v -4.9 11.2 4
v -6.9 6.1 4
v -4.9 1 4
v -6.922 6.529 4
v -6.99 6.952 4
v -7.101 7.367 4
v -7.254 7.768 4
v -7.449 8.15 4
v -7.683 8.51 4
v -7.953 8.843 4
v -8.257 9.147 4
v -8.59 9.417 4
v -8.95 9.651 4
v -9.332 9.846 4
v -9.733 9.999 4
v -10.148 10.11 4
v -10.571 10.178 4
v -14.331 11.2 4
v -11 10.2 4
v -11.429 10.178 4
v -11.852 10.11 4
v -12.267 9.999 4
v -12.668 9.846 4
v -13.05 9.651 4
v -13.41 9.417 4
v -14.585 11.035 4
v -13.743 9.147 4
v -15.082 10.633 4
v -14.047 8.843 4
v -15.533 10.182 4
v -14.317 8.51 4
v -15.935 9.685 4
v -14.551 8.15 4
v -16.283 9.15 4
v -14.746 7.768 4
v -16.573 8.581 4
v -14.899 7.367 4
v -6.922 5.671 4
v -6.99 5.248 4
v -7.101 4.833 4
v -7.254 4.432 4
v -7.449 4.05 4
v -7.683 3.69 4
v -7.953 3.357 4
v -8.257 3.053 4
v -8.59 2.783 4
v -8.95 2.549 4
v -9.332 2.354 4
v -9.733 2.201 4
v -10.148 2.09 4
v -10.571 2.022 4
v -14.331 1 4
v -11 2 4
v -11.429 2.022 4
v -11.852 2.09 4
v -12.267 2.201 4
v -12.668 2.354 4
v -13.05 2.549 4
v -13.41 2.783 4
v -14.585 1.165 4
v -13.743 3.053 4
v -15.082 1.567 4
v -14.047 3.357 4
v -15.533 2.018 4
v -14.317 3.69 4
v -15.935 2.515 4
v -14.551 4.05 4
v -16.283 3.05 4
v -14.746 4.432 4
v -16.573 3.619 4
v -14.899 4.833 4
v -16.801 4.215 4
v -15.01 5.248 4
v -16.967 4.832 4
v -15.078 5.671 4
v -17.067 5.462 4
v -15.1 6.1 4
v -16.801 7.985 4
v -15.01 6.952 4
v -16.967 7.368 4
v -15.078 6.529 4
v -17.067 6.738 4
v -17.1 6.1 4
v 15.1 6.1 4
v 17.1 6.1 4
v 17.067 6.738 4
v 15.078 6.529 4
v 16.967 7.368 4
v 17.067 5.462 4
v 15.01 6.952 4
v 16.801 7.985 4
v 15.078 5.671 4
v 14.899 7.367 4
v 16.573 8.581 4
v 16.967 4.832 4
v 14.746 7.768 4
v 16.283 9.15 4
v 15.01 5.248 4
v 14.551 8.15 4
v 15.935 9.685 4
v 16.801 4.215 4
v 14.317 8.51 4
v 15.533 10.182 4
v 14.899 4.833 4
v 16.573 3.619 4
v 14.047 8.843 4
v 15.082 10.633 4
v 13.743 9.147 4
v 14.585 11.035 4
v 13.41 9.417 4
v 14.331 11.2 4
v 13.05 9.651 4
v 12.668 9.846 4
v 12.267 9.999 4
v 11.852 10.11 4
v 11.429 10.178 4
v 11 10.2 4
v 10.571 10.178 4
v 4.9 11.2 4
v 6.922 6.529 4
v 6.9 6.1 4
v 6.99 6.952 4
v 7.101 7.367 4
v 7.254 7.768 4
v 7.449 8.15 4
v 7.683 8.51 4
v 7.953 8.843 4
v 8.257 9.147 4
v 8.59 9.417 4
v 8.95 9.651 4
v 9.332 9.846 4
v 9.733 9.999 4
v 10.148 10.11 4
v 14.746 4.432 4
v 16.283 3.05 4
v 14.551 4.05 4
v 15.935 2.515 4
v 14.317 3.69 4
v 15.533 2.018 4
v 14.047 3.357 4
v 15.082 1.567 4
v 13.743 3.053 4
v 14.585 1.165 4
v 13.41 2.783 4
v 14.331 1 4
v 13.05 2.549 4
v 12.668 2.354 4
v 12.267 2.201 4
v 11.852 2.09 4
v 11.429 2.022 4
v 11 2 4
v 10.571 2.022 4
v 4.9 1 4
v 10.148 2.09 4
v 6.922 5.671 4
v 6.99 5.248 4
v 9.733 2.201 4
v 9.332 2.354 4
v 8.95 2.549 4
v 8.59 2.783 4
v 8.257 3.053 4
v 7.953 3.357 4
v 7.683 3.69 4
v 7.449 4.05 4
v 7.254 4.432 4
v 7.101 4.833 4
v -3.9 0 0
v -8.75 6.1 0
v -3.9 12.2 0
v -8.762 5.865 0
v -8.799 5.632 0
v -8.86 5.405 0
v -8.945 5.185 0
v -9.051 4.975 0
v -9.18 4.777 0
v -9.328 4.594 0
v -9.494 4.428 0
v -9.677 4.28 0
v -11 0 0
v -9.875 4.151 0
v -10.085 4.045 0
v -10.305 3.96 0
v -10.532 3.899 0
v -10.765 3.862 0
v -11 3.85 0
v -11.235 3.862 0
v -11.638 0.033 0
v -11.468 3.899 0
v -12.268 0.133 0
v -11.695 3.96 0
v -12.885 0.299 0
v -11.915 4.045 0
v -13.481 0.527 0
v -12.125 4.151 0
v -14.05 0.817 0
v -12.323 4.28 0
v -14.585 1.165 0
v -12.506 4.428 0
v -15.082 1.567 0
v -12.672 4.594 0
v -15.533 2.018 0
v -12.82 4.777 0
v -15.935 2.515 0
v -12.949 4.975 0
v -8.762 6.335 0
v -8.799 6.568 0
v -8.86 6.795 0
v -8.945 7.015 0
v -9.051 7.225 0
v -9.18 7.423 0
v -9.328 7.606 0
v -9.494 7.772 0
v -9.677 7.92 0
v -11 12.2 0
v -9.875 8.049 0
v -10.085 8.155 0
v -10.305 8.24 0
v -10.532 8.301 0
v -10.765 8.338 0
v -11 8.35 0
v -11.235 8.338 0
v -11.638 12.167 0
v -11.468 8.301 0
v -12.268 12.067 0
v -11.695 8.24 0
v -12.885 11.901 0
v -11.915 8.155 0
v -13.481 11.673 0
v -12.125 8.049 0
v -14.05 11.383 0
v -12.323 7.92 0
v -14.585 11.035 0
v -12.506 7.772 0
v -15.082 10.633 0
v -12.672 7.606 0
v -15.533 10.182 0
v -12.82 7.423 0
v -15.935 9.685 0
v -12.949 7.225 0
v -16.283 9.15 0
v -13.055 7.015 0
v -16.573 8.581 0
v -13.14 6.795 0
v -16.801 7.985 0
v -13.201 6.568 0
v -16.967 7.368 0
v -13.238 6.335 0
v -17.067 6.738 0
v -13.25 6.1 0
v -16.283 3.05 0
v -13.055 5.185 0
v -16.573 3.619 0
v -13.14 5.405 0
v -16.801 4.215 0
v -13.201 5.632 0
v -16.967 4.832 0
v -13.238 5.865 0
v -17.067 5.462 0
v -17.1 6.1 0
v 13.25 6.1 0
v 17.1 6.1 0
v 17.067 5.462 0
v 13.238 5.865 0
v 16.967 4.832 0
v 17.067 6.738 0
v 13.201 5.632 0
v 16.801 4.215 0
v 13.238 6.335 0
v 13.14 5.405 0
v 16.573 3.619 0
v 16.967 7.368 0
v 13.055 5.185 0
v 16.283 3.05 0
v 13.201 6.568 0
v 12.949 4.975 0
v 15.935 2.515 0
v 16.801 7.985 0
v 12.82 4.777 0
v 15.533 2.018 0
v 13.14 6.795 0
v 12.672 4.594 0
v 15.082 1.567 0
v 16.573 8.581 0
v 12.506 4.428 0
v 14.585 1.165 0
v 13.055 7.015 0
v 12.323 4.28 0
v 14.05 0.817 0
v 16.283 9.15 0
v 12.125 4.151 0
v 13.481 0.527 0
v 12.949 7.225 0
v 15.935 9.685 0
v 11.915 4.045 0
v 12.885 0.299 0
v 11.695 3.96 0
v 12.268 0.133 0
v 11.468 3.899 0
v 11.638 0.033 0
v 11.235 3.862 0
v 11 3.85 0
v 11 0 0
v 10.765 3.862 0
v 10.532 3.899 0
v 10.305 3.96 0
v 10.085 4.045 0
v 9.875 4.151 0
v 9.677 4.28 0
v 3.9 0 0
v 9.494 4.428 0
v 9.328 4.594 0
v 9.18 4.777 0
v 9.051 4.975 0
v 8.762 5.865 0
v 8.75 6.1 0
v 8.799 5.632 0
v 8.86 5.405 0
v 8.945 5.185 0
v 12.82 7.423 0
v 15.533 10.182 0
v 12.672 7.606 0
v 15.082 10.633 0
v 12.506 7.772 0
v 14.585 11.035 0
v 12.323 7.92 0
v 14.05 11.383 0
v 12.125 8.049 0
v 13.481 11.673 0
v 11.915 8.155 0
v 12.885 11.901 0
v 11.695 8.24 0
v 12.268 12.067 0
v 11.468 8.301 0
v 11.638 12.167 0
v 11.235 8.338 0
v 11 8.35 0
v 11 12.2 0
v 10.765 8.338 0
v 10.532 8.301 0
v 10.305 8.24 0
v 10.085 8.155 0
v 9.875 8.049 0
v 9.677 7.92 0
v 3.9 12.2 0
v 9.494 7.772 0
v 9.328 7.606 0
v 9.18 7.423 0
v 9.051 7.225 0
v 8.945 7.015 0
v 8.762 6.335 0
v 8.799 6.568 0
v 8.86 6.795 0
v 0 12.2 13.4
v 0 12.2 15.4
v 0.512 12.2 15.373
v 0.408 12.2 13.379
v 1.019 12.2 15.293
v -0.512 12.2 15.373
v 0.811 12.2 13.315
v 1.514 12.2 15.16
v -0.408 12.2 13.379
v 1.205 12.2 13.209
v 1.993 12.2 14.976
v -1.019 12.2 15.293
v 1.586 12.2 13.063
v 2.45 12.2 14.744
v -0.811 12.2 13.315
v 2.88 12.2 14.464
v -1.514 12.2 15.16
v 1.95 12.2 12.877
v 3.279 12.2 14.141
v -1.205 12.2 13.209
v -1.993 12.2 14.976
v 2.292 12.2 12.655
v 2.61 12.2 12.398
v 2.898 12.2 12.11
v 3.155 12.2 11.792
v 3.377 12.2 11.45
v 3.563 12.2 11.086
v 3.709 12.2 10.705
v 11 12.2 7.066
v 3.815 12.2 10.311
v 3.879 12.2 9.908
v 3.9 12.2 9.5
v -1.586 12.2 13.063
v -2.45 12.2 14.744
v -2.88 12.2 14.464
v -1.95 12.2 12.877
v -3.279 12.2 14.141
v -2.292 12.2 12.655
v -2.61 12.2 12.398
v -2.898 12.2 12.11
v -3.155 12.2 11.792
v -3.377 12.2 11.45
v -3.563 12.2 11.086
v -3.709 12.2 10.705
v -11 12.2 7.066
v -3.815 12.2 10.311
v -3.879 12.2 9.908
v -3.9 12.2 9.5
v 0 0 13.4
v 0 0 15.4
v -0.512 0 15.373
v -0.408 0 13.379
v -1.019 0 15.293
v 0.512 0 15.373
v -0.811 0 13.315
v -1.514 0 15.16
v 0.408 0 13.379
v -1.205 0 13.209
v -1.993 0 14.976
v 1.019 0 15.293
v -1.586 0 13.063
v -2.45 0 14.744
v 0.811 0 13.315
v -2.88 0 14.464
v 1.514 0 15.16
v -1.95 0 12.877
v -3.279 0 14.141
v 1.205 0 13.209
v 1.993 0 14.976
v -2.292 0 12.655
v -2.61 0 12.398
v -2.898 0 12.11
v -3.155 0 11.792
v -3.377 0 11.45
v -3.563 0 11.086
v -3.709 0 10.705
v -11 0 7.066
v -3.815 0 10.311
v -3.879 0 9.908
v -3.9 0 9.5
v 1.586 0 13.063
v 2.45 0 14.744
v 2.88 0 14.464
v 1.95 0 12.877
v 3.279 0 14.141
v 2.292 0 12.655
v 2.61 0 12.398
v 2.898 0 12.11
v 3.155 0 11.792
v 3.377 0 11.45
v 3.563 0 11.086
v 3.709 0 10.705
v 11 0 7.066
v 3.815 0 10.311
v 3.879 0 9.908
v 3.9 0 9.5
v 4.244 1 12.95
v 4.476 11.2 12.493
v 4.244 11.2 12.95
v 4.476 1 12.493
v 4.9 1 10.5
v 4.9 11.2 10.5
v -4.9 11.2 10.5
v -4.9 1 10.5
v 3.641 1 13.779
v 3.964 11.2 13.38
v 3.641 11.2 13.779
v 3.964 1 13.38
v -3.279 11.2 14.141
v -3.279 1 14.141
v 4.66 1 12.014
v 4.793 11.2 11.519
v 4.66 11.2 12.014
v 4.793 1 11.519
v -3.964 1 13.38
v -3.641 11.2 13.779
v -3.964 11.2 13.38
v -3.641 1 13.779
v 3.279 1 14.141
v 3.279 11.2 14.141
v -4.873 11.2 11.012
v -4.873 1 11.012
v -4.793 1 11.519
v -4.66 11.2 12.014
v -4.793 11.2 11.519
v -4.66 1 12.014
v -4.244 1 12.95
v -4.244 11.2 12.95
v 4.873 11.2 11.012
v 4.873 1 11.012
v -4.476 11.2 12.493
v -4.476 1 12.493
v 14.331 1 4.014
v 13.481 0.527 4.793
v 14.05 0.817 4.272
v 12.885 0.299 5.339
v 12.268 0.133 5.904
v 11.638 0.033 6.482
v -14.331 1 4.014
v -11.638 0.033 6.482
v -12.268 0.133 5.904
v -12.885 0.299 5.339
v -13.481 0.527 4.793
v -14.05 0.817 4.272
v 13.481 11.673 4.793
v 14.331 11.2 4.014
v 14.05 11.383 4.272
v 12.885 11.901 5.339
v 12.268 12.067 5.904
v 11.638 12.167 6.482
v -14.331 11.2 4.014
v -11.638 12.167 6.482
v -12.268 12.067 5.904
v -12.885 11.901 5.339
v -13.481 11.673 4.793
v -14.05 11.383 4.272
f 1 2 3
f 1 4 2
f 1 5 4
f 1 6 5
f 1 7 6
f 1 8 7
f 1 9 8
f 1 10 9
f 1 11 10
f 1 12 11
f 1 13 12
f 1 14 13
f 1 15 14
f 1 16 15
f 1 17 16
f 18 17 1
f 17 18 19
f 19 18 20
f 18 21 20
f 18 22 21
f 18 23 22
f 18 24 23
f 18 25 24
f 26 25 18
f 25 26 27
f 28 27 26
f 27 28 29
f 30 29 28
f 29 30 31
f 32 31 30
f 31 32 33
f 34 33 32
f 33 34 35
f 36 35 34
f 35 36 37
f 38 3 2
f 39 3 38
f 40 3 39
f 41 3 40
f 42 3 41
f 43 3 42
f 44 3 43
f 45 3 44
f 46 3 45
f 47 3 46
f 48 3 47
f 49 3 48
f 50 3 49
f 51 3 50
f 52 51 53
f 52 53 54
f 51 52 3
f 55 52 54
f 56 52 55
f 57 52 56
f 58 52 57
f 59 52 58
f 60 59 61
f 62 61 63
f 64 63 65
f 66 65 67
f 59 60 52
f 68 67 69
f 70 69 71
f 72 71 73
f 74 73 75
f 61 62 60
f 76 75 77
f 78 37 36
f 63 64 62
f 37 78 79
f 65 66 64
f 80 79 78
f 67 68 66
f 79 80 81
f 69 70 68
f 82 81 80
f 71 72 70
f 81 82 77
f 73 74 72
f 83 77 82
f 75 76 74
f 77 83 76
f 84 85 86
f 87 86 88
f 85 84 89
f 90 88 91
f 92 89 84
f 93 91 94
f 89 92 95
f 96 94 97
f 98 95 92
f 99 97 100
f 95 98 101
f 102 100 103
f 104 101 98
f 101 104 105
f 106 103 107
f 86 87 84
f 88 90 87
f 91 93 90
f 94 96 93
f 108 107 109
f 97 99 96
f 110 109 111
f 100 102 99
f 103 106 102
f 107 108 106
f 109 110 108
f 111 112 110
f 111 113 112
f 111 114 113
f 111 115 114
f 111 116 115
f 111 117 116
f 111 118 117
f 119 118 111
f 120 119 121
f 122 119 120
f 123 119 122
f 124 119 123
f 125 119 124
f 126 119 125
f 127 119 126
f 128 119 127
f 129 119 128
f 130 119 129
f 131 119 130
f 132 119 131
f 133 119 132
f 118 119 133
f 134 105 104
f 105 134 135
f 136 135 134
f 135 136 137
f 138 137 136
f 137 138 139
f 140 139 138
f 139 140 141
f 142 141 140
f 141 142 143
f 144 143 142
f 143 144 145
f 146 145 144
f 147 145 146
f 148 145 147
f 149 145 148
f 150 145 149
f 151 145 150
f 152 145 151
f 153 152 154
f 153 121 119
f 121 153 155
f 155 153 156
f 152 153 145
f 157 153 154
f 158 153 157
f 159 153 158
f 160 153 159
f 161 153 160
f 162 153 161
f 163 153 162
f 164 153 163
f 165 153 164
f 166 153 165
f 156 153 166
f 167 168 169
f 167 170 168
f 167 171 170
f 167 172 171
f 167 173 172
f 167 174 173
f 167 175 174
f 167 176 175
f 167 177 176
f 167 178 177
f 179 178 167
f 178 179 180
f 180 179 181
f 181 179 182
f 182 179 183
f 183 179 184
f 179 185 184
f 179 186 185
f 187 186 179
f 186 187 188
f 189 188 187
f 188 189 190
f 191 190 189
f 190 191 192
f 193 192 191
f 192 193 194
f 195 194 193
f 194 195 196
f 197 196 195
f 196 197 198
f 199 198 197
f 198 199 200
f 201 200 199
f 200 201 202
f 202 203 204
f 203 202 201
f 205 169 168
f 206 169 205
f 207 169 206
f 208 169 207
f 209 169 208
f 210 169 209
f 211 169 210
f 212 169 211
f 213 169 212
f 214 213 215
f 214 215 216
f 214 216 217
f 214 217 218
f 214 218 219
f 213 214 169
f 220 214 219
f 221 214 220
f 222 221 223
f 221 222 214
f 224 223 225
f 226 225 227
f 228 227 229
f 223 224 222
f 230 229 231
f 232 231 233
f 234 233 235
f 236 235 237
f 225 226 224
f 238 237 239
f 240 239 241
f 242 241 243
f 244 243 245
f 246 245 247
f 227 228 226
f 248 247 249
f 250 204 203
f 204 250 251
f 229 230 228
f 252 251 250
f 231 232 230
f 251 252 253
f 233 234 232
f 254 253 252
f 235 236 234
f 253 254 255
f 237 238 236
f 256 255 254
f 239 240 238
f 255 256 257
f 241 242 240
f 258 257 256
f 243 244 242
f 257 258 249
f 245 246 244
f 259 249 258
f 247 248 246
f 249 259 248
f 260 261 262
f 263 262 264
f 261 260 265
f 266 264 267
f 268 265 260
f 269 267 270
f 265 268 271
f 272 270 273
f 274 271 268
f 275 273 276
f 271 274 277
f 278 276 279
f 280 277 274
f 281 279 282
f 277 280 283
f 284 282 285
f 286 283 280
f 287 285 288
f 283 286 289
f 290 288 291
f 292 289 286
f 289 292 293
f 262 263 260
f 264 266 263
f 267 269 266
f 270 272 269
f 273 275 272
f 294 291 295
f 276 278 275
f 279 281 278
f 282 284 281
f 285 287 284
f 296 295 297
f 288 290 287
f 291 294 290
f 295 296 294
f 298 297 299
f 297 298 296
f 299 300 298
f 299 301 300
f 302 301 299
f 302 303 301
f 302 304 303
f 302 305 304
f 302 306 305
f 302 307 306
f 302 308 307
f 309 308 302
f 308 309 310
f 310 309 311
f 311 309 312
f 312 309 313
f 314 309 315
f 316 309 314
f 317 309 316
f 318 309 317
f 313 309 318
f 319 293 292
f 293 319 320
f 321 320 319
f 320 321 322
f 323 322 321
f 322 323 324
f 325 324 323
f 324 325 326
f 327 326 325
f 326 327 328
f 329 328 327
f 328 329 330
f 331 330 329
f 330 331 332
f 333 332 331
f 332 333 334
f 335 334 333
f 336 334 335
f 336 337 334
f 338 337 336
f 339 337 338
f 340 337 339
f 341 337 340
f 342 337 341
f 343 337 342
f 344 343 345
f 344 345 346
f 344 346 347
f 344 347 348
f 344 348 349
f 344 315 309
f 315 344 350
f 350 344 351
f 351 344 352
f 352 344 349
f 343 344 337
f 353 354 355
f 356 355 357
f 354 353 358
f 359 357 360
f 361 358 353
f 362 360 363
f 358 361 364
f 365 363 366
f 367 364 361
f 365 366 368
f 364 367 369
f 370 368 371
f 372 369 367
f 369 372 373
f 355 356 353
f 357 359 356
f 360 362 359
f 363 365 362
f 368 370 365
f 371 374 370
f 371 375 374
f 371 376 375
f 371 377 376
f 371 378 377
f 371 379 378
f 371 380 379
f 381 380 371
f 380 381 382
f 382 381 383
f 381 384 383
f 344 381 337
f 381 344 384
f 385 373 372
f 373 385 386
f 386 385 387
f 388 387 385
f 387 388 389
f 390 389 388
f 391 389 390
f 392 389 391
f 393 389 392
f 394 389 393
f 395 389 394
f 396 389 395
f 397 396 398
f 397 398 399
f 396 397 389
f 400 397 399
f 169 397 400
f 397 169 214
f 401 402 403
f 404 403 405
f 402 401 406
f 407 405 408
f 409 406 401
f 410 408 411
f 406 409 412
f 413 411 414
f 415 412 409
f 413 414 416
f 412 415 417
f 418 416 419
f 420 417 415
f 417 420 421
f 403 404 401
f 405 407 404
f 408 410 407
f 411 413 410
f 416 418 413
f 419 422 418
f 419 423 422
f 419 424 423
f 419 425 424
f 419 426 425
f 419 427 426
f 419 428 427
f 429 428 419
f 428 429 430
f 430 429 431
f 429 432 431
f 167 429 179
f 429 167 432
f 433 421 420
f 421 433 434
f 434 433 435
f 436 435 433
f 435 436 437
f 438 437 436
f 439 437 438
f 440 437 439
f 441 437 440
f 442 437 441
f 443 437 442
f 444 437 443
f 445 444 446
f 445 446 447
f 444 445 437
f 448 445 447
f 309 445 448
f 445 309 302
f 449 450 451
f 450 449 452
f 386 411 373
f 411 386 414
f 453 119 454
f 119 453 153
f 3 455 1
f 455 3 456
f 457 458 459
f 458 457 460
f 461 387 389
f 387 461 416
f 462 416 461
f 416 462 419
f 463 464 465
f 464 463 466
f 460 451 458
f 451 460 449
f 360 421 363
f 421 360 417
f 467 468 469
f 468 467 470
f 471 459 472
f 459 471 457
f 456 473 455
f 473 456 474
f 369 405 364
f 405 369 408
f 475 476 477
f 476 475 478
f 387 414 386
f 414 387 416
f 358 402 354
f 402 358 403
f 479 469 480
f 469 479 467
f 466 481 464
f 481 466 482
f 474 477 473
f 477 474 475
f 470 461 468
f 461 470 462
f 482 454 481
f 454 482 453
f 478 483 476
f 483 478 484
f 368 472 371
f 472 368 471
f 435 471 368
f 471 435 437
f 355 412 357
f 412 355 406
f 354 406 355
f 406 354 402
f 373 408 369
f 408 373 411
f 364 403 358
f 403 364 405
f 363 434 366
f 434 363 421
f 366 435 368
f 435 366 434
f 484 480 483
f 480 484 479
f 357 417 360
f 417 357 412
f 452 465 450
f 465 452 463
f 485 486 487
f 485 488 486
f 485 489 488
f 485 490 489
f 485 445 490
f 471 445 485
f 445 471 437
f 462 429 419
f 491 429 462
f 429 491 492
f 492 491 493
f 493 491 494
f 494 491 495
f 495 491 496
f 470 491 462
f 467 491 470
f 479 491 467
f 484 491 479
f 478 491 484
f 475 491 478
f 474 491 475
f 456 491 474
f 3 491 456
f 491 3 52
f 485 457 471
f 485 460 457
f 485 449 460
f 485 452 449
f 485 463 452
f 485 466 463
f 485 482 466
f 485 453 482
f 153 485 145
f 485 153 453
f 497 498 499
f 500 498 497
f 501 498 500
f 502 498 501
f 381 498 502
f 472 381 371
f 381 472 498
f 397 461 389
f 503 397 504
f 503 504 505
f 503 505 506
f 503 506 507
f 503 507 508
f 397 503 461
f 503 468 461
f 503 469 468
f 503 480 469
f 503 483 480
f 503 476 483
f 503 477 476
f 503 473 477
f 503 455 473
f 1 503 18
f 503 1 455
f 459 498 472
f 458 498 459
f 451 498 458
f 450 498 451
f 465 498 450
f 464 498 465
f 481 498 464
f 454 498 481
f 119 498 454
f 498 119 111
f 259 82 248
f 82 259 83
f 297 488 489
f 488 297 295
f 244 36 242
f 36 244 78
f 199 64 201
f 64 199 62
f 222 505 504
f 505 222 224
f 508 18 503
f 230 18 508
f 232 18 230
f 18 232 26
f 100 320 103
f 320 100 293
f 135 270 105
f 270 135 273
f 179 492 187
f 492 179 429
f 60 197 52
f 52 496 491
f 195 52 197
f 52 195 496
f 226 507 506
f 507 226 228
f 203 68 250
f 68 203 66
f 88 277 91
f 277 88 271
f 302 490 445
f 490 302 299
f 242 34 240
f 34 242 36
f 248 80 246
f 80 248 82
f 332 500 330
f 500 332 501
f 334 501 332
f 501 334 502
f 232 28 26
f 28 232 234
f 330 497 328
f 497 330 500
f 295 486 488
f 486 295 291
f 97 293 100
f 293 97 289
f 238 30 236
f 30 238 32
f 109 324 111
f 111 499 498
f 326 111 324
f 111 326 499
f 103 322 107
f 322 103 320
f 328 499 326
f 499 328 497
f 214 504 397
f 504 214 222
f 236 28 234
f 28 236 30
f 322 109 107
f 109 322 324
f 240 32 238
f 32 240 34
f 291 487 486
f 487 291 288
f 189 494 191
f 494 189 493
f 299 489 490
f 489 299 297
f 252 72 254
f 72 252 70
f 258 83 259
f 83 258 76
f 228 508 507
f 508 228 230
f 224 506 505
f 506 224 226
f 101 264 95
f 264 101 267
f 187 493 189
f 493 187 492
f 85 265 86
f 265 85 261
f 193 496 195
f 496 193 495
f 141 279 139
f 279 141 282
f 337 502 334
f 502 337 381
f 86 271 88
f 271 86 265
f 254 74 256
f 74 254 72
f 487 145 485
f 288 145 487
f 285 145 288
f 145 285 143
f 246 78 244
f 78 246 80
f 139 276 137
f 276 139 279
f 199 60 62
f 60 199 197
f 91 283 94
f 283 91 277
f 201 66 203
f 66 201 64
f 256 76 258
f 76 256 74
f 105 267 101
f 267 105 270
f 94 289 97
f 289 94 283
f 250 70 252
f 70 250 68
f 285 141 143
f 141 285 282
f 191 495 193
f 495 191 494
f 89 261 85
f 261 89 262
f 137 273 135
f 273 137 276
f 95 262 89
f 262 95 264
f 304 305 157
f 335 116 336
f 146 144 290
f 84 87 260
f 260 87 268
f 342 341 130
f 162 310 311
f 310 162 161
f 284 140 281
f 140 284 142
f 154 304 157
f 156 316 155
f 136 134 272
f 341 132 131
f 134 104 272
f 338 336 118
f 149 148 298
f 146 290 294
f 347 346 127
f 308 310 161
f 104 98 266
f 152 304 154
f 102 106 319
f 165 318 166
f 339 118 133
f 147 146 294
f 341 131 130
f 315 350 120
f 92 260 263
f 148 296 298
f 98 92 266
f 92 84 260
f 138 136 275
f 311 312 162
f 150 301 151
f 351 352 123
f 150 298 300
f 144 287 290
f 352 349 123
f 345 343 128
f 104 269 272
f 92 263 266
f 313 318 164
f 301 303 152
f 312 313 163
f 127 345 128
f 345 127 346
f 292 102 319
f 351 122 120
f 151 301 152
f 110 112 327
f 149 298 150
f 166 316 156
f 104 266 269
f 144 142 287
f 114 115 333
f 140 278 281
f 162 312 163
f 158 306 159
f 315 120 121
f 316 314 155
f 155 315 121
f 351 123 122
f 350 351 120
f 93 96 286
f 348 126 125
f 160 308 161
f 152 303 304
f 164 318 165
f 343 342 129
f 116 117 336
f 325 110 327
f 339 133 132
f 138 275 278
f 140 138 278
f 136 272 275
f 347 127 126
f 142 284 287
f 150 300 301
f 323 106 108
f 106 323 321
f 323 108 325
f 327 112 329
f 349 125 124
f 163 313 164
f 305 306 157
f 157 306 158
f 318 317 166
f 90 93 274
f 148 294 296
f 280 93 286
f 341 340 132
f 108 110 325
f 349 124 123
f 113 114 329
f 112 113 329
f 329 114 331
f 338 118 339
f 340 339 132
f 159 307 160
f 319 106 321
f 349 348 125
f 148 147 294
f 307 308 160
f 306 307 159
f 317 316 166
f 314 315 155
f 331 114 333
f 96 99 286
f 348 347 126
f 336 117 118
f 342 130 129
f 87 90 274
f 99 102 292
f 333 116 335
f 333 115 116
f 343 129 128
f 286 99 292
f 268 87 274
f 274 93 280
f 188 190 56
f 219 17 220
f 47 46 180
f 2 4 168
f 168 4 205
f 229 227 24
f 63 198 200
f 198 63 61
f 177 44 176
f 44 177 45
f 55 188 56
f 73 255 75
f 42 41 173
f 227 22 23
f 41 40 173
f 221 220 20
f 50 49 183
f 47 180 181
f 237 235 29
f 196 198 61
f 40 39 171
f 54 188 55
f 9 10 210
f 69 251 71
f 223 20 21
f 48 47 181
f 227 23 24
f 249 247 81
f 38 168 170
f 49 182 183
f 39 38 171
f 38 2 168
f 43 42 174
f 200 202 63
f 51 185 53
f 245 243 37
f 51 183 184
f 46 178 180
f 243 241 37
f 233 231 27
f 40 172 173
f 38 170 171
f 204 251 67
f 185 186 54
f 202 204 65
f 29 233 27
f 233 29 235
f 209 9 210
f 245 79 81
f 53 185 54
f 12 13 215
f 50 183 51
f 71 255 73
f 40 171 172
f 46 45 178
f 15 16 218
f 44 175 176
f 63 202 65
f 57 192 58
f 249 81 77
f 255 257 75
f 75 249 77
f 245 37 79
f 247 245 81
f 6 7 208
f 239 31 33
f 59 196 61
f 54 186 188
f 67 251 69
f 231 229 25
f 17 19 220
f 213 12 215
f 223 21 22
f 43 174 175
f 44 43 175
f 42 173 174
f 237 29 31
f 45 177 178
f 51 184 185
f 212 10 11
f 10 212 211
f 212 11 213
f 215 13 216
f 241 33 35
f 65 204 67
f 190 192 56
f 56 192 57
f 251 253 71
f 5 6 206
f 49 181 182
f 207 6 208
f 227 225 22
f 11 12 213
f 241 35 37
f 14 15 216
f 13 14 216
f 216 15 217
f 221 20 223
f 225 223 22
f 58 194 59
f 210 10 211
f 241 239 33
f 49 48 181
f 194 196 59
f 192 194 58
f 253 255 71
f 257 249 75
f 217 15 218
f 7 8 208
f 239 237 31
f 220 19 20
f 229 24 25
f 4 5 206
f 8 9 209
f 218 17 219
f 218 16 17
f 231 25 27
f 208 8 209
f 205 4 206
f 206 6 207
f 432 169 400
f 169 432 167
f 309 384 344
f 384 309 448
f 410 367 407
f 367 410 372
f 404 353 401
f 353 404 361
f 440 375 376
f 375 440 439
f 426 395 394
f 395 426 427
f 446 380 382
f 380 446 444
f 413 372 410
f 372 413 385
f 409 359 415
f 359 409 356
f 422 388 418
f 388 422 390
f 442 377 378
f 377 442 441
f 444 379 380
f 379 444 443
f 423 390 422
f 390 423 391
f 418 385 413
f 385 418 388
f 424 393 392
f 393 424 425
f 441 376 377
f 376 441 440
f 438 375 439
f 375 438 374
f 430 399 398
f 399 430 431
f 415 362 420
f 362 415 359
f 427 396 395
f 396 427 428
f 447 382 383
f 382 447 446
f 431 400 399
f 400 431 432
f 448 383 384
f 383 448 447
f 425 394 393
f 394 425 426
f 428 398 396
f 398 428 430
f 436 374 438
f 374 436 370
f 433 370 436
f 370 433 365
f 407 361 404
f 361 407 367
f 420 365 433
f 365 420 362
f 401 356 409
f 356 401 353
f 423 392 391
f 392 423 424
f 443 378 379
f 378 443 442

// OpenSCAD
//The diameter of your pipe
pipe_d = 7.8;

//The lift your pipe from surface
pipe_lift = 5.6;

//Measurements for the screw

//Screw Thread Diameter
screw_d = 4.5;

//Screw Head Diameter
screwh_d = 8.2; //8.2

//Screw Coutersunk depth
screw_trans = 4;

//Generate support for the bridge
support_d = 0;

//Thickness of the base
base_thickness = 4;

//Thickness of the structure
mount_t = 1; //mount thickness




base_thick = max(base_thickness,screw_trans);

pipe_r = pipe_d/2;

mount_d = screwh_d + mount_t *2 + 2; //mount depth

mount_w = pipe_d + (mount_d + mount_t) * 2;  //mount wings width

mount_w_trust =  mount_w - mount_d + 2*sqrt(pow(mount_d/2,2)-pow(mount_d/2-mount_t,2));
    //mount trust width
echo( mount_w_trust);

pipe_rplus = pipe_r + mount_t;//outer pipe

$fn = 60;
module screw (){
	//head
	cylinder(h = 40, r = screwh_d/2, center=false);

	//transition
	
	translate([0,0, -screw_trans])
	cylinder(h = screw_trans, r2 = screwh_d/2, r1 = screw_d /2, center=false);

	//screw shaft
	translate([0, 0, -40- screw_trans])
	cylinder(h = 40, r = screw_d/2, center=false);

}


module trust(){

	//mount_w_trust = mount_w - 6;
	
	hull()
	{
		translate([0, 0, pipe_rplus + pipe_lift])
		rotate([-90, 0, 0])
		cylinder(r = pipe_rplus, h = mount_t, center=false);


		translate([-mount_w_trust/2, 0, 0])
		cube([mount_w_trust,mount_t,base_thick]);
	}
}

//Tunnel
module pipe(piper = pipe_r, heig = 20) {
	hull()
	{
		translate([0, 0, piper + pipe_lift])
		rotate([-90, 0, 0])
		cylinder(r = piper, h = heig, center=false);

		translate([-piper, 0, 0])
		cube([piper*2,heig,1]);
	}
}


module body_raw() {
	translate([-mount_w /2, 0, 0])
	cube([mount_w,mount_d , base_thick]);

	pipe(piper = pipe_rplus, heig = mount_d);

	trust();
	translate([0, mount_d- mount_t, 0])
	trust();
}

module body() {
	intersection() {
		body_raw();
		translate([-(mount_w -mount_d)/2, mount_d/2, 0])
		hull() {
			cylinder( h = pipe_rplus * 2+pipe_lift, r = mount_d/2, center=false);
			translate([mount_w-mount_d, 0, 0])
			cylinder( h = pipe_rplus * 2+pipe_lift, r = mount_d/2, center=false);
		}
	}
}


difference()
{
	body();
	
	//internal pipe
	translate([0, support_d,0])
	pipe(pipe_d/2,mount_d-support_d * 2);
	
	translate([pipe_rplus + mount_d/2, mount_d /2, base_thick])
	#screw();

	translate([-pipe_rplus - mount_d/2, mount_d /2, base_thick])
	#screw();
}
